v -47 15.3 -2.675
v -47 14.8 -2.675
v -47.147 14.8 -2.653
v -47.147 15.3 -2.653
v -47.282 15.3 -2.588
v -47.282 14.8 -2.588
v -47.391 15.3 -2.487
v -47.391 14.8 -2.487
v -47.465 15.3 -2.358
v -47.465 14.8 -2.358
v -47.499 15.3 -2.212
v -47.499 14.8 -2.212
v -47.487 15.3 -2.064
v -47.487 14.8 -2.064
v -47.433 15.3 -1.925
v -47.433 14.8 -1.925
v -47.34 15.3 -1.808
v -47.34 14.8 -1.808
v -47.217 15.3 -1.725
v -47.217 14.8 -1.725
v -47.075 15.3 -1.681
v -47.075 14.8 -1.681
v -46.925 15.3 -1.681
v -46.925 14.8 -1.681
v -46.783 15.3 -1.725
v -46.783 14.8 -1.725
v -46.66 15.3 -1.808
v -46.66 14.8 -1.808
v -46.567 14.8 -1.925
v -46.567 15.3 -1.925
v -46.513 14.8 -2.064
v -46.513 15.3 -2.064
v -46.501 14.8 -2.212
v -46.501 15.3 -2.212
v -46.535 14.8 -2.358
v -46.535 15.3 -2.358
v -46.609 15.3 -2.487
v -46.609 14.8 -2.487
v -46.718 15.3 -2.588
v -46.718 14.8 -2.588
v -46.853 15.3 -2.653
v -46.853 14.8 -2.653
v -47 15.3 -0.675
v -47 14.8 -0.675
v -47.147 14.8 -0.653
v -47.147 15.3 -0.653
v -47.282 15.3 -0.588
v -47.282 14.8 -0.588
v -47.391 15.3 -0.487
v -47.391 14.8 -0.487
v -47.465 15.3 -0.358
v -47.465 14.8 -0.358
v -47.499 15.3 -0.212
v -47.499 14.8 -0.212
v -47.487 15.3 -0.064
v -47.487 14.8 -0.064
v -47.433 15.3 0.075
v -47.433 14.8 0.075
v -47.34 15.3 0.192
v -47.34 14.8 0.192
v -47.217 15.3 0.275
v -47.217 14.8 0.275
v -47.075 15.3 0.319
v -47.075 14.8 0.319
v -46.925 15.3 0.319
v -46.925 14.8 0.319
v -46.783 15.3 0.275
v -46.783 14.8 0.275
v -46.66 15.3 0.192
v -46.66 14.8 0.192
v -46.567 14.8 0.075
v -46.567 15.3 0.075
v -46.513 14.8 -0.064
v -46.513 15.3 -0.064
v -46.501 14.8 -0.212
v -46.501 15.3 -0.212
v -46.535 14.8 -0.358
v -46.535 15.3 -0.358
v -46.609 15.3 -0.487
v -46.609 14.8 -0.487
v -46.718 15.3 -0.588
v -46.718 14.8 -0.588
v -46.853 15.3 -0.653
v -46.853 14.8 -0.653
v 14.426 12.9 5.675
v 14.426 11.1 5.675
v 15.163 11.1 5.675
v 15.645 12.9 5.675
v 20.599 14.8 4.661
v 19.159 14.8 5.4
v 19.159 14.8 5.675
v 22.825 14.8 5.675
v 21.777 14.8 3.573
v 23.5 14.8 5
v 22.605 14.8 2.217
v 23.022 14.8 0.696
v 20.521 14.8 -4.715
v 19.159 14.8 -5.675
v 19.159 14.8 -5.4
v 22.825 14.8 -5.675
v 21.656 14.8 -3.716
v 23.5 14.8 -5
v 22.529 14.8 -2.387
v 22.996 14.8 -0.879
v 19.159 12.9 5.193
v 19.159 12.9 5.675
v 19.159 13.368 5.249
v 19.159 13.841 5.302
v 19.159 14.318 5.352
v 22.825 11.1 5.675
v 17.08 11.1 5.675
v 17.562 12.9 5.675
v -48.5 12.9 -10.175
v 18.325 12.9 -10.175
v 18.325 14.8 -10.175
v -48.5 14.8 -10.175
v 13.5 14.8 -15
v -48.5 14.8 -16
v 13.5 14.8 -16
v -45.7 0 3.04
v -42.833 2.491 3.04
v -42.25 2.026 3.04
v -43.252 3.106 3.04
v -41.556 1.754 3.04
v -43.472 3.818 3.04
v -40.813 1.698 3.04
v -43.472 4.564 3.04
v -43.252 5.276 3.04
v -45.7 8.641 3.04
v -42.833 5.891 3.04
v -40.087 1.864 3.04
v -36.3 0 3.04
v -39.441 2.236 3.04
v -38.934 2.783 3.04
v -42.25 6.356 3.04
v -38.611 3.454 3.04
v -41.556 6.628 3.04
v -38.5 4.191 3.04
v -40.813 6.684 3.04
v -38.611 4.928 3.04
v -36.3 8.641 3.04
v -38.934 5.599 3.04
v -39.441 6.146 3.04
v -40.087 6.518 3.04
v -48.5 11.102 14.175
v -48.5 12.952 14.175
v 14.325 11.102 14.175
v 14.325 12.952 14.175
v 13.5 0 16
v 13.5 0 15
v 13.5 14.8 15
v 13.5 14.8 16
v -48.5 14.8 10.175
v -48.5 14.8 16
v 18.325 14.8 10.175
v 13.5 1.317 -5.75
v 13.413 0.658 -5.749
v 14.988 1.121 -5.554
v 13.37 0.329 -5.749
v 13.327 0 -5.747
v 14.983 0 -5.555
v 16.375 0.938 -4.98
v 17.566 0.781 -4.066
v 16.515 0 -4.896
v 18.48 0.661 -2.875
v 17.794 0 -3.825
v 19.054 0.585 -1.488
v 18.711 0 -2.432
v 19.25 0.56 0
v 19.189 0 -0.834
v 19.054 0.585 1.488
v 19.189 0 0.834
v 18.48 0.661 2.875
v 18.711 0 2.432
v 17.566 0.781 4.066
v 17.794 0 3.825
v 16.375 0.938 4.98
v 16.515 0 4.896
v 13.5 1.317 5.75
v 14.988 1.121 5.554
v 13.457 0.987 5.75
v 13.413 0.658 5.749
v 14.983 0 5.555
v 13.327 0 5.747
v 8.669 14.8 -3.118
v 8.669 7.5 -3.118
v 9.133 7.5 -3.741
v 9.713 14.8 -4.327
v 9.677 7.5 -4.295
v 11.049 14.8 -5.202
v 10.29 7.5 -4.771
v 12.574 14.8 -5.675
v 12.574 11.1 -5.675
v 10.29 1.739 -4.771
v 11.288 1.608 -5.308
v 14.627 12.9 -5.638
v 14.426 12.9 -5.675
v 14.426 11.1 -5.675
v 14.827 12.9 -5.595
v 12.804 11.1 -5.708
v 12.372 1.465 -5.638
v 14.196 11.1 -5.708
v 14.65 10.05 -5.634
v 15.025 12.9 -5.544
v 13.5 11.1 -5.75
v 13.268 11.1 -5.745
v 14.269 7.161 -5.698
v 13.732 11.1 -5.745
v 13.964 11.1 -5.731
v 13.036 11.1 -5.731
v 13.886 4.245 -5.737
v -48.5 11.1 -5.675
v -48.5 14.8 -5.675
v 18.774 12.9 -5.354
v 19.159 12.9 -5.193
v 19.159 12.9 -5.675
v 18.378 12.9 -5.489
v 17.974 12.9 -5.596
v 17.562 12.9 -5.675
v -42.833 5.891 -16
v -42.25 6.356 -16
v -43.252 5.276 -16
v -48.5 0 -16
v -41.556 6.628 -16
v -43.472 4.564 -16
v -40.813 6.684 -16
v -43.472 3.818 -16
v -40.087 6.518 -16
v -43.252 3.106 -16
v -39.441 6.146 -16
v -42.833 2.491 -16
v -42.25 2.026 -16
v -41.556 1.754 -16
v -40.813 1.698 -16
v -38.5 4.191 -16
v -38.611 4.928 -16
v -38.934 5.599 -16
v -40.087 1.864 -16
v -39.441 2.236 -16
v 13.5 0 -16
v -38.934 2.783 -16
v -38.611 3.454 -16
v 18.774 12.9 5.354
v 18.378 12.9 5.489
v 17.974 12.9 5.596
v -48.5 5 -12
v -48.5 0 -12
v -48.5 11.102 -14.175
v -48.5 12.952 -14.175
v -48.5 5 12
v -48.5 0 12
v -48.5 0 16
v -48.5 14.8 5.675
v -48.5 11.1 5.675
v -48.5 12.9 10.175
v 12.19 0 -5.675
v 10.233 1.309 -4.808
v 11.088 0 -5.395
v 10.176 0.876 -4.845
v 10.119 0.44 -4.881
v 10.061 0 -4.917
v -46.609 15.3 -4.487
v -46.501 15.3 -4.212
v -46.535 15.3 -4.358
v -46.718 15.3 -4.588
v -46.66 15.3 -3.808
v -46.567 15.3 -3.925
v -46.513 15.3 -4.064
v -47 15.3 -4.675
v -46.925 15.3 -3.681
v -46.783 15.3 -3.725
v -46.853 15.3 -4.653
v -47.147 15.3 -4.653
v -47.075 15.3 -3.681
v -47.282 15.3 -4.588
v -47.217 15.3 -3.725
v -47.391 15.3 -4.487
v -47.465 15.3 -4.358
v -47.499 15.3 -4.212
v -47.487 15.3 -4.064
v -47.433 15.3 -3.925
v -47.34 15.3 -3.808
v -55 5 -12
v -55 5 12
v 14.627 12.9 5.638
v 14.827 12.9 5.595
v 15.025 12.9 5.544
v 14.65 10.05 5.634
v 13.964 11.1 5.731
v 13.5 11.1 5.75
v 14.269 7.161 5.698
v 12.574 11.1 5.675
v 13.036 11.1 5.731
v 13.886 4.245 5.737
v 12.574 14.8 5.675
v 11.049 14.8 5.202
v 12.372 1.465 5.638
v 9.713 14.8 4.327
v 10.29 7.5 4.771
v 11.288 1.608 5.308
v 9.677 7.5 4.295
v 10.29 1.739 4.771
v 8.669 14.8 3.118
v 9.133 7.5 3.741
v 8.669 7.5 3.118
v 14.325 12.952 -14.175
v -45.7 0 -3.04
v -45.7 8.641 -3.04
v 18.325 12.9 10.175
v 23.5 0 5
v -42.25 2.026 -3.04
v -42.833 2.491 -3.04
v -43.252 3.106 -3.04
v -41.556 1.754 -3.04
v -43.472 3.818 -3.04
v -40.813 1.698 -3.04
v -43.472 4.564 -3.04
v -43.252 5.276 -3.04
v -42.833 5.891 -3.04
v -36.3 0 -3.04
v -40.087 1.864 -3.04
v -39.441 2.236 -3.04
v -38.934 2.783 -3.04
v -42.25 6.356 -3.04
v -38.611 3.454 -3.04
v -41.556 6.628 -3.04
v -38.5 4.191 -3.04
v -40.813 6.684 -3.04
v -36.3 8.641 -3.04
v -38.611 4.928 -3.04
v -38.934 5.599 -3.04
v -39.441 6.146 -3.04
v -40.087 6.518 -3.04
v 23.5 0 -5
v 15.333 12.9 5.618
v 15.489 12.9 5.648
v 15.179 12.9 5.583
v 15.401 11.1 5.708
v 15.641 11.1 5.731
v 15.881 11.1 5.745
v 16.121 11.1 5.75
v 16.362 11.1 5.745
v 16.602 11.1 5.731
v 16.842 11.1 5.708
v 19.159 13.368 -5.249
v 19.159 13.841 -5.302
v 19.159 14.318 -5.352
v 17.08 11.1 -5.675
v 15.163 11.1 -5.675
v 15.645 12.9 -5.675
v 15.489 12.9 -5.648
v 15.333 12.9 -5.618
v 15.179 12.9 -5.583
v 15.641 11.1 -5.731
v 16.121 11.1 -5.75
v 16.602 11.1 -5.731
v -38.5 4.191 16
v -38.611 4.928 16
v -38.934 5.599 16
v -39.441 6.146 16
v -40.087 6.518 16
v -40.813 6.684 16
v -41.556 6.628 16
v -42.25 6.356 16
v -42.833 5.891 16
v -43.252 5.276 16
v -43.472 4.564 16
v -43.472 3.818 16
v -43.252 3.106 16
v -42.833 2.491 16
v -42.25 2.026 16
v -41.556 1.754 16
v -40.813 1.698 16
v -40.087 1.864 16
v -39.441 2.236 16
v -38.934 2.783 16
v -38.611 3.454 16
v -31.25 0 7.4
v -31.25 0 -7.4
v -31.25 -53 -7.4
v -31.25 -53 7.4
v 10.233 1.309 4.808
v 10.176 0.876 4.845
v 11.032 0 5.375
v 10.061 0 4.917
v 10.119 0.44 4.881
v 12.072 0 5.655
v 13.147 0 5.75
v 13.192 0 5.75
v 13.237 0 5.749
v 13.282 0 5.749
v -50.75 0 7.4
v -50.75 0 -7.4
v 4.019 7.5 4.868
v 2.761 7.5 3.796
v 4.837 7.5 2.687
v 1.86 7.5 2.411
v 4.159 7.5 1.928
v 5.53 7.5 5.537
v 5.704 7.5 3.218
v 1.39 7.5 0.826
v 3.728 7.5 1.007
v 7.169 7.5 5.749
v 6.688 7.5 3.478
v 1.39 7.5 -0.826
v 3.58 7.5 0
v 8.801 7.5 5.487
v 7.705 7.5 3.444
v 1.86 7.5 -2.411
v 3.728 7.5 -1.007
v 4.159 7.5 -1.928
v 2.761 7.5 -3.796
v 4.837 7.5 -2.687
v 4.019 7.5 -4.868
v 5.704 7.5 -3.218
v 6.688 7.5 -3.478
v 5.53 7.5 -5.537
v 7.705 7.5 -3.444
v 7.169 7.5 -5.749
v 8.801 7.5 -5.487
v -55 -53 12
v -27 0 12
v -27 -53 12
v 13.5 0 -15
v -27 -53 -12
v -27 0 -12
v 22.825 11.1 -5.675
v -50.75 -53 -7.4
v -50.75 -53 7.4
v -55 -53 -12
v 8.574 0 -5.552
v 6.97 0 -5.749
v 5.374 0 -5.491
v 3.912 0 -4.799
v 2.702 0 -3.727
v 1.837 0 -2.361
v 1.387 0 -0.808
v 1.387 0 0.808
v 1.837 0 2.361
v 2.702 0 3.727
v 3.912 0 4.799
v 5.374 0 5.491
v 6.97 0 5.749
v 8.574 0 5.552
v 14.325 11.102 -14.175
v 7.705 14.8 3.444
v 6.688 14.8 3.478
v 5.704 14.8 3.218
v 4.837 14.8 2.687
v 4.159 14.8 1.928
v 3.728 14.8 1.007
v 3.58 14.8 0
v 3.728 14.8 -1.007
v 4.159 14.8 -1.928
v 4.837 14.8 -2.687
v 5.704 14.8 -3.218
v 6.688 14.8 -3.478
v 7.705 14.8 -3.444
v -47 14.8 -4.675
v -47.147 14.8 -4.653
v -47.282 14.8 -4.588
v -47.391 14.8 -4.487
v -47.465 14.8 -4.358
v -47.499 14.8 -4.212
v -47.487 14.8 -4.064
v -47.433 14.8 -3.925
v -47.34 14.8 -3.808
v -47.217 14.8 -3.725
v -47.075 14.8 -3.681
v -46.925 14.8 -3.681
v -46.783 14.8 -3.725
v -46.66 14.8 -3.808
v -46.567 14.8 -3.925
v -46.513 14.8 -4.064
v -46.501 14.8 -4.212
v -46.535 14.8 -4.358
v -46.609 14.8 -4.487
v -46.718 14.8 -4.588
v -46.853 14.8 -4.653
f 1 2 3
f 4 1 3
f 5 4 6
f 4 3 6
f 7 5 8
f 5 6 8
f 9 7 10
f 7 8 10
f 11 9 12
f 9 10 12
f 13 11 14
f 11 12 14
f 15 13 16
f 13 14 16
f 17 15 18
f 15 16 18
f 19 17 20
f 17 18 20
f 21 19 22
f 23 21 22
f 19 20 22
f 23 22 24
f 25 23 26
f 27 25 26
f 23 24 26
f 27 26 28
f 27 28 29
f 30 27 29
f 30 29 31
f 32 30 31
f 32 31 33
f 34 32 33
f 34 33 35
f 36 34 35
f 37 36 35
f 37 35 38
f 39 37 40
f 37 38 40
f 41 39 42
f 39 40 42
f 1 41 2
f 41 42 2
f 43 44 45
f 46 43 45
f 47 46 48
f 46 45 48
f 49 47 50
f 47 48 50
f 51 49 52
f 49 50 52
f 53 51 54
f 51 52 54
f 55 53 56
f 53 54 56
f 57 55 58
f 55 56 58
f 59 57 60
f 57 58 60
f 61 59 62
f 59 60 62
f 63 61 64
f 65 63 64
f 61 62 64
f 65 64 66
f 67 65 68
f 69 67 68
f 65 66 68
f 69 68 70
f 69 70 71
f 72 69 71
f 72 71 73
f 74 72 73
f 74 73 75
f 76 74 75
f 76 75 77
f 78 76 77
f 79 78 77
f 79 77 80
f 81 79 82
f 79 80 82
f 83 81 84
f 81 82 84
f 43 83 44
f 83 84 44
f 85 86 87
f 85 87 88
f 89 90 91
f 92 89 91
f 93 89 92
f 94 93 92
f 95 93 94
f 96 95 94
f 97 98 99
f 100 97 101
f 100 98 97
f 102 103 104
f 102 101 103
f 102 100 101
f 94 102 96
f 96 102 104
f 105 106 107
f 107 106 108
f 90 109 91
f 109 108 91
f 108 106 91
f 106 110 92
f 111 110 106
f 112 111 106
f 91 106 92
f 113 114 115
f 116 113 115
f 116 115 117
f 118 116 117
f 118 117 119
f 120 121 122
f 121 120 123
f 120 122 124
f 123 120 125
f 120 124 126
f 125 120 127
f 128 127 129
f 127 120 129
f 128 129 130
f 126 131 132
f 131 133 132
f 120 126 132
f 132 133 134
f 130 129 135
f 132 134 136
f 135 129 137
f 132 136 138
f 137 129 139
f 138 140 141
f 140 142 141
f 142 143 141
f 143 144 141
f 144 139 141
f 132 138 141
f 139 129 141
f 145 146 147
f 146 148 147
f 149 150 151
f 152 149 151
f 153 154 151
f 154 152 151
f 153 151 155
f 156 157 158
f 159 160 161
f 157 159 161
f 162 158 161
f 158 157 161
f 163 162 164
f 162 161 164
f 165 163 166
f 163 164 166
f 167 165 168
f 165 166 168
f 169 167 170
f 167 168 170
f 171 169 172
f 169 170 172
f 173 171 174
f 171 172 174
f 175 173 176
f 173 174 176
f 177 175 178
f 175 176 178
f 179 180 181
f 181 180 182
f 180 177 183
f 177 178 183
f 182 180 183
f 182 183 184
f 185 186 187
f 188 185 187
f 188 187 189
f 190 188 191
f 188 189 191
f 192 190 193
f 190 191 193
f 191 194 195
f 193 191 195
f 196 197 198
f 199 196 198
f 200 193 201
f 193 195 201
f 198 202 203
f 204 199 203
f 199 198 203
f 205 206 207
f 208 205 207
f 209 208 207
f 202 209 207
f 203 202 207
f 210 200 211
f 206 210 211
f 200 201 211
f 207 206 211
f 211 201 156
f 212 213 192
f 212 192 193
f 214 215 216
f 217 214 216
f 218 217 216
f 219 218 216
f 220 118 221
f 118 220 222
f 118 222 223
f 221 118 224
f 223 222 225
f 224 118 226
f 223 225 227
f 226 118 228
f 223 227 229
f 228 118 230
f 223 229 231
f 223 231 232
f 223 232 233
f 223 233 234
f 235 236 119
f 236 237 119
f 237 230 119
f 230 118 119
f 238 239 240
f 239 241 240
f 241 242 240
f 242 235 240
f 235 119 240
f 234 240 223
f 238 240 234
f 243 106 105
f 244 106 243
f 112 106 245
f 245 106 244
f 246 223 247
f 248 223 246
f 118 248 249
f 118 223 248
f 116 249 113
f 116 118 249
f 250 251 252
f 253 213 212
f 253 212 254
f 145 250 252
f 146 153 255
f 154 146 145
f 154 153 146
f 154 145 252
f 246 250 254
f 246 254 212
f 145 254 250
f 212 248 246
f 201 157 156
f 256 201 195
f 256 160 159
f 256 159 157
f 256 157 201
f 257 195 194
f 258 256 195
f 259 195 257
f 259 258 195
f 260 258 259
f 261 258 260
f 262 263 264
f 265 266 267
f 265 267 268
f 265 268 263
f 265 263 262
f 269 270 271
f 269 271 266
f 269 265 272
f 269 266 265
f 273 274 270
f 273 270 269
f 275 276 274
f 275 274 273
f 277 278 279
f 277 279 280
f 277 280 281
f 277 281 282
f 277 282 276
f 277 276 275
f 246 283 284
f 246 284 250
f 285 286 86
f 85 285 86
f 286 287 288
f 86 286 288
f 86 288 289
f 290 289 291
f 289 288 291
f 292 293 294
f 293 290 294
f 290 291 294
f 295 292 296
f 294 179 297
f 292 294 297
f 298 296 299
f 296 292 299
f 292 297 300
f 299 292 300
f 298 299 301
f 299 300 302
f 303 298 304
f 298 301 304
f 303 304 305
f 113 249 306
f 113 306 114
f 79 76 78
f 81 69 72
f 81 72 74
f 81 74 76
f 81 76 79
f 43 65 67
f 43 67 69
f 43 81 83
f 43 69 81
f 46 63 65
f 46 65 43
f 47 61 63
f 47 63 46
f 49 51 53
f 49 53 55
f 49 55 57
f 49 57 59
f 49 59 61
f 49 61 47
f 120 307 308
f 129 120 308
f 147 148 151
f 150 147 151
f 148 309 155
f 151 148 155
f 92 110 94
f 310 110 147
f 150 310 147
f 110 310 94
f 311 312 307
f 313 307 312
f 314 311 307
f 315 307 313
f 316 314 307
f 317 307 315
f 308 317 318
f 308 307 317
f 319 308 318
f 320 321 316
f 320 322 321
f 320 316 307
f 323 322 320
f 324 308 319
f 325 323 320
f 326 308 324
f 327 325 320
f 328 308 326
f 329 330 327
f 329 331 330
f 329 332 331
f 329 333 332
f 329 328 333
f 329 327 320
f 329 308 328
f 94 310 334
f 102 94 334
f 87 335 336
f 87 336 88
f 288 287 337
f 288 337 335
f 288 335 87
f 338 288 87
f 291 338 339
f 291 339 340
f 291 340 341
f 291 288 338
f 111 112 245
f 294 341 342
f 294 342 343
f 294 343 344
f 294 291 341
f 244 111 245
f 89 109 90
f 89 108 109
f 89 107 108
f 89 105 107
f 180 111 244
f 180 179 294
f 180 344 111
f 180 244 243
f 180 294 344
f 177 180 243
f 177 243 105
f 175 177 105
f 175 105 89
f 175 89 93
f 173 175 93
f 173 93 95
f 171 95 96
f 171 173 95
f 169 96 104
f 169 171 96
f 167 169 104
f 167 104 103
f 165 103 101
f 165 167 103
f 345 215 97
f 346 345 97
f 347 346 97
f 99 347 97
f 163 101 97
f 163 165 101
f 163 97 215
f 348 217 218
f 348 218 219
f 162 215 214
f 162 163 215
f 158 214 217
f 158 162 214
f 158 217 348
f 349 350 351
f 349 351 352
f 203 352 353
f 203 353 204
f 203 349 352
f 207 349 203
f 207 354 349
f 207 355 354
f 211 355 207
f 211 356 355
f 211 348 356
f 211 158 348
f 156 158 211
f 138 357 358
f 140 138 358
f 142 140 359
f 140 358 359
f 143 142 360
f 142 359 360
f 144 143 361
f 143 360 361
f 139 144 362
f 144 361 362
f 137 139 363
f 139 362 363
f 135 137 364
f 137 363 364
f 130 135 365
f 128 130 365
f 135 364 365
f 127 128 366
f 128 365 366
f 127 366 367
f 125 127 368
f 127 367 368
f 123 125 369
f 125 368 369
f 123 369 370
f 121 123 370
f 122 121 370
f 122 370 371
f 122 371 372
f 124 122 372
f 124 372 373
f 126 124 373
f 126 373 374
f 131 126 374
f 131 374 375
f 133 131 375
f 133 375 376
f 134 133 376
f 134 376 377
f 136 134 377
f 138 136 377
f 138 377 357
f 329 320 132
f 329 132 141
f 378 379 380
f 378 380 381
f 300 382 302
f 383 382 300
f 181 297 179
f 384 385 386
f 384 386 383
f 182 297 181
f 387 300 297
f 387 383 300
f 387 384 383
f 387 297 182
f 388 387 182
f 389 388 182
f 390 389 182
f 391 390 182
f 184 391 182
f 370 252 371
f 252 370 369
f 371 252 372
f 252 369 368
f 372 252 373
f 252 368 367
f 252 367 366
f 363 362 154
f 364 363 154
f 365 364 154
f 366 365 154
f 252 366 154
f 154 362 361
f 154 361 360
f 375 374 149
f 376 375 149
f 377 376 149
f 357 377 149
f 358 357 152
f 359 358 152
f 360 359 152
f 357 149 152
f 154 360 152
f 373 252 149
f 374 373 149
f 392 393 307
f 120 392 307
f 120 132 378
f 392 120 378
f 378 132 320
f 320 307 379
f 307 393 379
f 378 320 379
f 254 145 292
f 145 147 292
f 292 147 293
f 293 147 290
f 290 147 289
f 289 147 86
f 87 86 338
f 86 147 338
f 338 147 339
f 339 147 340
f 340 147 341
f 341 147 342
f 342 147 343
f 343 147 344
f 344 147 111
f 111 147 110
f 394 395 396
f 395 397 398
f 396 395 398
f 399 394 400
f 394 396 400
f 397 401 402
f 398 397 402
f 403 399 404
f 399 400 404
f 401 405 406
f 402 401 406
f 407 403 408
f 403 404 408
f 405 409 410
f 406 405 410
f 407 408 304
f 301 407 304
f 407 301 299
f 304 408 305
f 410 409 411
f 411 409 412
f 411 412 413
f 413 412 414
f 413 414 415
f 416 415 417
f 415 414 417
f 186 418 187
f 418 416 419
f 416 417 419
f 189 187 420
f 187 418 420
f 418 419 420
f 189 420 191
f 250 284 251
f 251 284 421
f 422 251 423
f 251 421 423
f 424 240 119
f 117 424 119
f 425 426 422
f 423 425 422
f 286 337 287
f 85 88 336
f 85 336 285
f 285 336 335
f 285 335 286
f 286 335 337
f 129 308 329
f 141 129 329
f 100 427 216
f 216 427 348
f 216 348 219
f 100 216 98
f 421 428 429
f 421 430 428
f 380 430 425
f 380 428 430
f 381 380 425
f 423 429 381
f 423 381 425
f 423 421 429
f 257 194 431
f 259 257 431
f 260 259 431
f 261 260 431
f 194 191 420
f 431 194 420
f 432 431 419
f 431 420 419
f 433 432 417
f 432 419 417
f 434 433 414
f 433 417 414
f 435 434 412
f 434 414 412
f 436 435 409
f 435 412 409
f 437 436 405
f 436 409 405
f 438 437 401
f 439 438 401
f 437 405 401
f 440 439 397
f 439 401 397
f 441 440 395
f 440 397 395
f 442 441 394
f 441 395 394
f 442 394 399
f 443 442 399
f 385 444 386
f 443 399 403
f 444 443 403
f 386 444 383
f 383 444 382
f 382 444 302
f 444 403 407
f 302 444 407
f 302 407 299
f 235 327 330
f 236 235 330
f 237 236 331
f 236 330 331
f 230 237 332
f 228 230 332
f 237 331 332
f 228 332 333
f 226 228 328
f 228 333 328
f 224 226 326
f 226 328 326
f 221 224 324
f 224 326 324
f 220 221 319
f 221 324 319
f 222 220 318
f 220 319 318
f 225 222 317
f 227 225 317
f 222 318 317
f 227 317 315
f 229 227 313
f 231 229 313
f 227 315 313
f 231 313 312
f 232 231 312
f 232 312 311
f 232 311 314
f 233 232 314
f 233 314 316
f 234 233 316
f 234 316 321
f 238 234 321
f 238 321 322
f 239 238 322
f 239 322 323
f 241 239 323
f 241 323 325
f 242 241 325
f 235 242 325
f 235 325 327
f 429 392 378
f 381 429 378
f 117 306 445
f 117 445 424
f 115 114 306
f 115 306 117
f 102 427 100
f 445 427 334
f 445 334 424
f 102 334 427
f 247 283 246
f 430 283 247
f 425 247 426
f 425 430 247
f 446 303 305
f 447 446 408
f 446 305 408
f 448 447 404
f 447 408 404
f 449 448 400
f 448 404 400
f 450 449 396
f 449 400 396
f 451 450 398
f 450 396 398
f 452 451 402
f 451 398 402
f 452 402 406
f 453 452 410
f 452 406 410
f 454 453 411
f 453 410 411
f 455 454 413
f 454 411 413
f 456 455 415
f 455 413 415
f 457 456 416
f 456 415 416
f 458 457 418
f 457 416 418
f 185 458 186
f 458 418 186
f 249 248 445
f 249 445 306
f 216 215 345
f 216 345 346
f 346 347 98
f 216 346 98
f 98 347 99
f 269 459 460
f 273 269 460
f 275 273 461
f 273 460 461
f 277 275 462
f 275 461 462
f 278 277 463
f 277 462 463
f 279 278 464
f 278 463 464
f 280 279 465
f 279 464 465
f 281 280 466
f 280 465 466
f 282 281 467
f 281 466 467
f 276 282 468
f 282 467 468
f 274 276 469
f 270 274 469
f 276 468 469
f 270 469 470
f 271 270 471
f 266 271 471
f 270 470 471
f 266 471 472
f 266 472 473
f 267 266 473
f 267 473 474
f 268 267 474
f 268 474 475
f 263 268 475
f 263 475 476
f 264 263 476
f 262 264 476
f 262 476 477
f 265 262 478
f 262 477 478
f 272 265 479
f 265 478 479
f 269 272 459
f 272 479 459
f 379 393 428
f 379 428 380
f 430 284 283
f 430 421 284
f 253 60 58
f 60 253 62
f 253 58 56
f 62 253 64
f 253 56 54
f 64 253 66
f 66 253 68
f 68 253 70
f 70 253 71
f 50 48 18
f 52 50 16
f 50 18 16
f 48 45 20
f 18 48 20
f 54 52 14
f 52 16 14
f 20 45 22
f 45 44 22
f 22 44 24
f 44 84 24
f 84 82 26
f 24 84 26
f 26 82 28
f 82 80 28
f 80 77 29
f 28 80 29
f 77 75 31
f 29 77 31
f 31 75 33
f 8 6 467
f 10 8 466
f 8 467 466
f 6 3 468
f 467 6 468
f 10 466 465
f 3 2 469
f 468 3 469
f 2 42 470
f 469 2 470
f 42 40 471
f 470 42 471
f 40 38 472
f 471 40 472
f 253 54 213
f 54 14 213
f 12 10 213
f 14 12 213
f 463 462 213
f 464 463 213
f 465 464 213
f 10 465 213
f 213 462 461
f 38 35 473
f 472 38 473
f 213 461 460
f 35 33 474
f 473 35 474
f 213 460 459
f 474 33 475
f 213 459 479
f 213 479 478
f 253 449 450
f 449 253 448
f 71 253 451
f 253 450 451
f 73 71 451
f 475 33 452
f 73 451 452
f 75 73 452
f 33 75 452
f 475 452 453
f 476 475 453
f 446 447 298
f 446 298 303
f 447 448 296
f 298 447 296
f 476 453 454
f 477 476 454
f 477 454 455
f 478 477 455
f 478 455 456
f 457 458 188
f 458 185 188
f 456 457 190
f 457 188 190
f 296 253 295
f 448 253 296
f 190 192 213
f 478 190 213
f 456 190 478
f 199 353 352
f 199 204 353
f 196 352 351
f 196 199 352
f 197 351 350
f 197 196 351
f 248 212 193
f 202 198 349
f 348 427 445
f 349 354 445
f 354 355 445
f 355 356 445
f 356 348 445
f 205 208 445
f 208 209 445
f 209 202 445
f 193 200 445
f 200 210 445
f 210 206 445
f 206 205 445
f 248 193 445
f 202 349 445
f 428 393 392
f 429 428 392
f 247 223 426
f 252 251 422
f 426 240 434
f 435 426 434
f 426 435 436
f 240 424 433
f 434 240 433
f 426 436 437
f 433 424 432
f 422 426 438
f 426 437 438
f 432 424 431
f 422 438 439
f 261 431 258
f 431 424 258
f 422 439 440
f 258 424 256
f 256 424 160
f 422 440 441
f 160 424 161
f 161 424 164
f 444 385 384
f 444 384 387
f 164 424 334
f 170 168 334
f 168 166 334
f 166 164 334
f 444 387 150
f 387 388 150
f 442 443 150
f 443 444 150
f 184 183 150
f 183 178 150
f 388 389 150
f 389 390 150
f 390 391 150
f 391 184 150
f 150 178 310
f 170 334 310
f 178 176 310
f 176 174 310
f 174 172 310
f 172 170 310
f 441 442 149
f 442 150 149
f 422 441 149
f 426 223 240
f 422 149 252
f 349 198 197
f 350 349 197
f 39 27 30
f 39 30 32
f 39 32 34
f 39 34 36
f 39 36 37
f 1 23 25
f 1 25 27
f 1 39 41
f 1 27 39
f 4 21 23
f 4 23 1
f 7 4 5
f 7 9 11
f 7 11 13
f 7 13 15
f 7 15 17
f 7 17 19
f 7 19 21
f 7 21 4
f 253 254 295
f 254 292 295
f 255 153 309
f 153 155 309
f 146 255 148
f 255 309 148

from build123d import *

# Parameters (mm, degrees)
SKETCH1_W               = 47
SKETCH1_H               = 30
BOSS_EXTRUDE1_DEPTH     = 14.8
SKETCH2_R               = 5.75
CUT_EXTRUDE1_DEPTH      = 32.564061843
SKETCH10_W              = 15
SKETCH10_H              = 23
BOSS_EXTRUDE2_DEPTH     = 10
SKETCH9_R               = 2.5
CUT_EXTRUDE2_DEPTH      = 52.780787943
SKETCH9_3_W             = 8.89
SKETCH9_3_H             = 8.382
SKETCH9_3_R             = 2.5
CUT_EXTRUDE3_DEPTH      = 28.04
SKETCH14_W              = 11.152996248
SKETCH14_H              = 9.480152006
BOSS_EXTRUDE3_DEPTH     = 11.96
CUT_EXTRUDE6_DEPTH      = 31
CUT_EXTRUDE6_DEPTH_BACK = 111
SKETCH15_R              = 2.5
CHAMFER1_SIZE           = 10
CUT_EXTRUDE7_DEPTH      = 58.99137867
SKETCH17_W              = 15
SKETCH17_H              = 23
CUT_EXTRUDE8_DEPTH      = 10
CUT_EXTRUDE9_DEPTH      = 31.734725749
CUT_EXTRUDE9_DEPTH_BACK = 31.734725749
SKETCH18_R              = 5.75
CUT_EXTRUDE10_START     = -7.3
SKETCH19_R              = 5.75
CUT_EXTRUDE10_DEPTH     = 25.264061843
SKETCH20_W              = 37
SKETCH20_H              = 14.8
SKETCH20_R              = 2.5
BOSS_EXTRUDE4_DEPTH     = 1
BOSS_EXTRUDE5_START     = 1
SKETCH21_W              = 37
SKETCH21_H              = 14.8
SKETCH21_R              = 2.5
BOSS_EXTRUDE5_DEPTH     = 1
BOSS_EXTRUDE6_DEPTH     = 25
CUT_EXTRUDE11_REACH     = 59.065
SKETCH22_W              = 5.115877125
SKETCH22_H              = 1.9
SKETCH24_R              = 2.5
CUT_EXTRUDE12_DEPTH     = 60.960737154
CUT_EXTRUDE13_START     = -19.04
SKETCH25_W              = 9.4
SKETCH25_H              = 8.9
CUT_EXTRUDE13_DEPTH     = 6.08
SKETCH26_W              = 23.327842288
SKETCH26_H              = 8.382
BOSS_EXTRUDE7_DEPTH     = 32
SKETCH27_R              = 3.5
CUT_EXTRUDE14_DEPTH     = 10
SKETCH28_R              = 0.5
BOSS_EXTRUDE8_DEPTH     = 0.5
SKETCH29_W              = 28
SKETCH29_H              = 24
SKETCH29_W_2            = 19.5
SKETCH29_H_2            = 14.8
BOSS_EXTRUDE9_DEPTH     = 53
SKETCH30_W              = 6.5
SKETCH30_H              = 24
BOSS_EXTRUDE10_DEPTH    = 5


with BuildPart() as part:
    # Sketch1 → Boss-Extrude1 (new body)
    with BuildSketch(Plane(origin=(0, 0, 0), x_dir=(1, 0, 0), z_dir=(0, 1, 0))):
        Rectangle(SKETCH1_W, SKETCH1_H)
    extrude(amount=BOSS_EXTRUDE1_DEPTH)

    # Sketch2 → Cut-Extrude1 (cut, through all)
    with BuildSketch(Plane.XZ):
        with Locations(Location((13.5, 0, 0), (0, 0, 270))):
            Circle(SKETCH2_R)
    extrude(amount=-CUT_EXTRUDE1_DEPTH, mode=Mode.SUBTRACT)

    # Sketch10 → Boss-Extrude2 (add)
    with BuildSketch(Plane.XY.offset(15)):
        with Locations((-16, 11.5)):
            Rectangle(SKETCH10_W, SKETCH10_H)
    extrude(amount=BOSS_EXTRUDE2_DEPTH)

    # Sketch9 → Cut-Extrude2 (cut, through all)
    with BuildSketch(Plane.XY.offset(25)):
        with Locations((-16, 4.191)):
            Circle(SKETCH9_R)
    extrude(amount=-CUT_EXTRUDE2_DEPTH, mode=Mode.SUBTRACT)

    # Sketch9<3> → Cut-Extrude3 (cut)
    with BuildSketch(Plane.XY.offset(25)):
        with Locations((-16, 4.191)):
            Rectangle(SKETCH9_3_W, SKETCH9_3_H)
        with Locations((-16, 4.191)):
            Circle(SKETCH9_3_R, mode=Mode.SUBTRACT)
    extrude(amount=-CUT_EXTRUDE3_DEPTH, mode=Mode.SUBTRACT)

    # Sketch14 → Boss-Extrude3 (add)
    with BuildSketch(Plane.XY.offset(15)):
        with Locations((-17.328151157, 4.740076003)):
            Rectangle(SKETCH14_W, SKETCH14_H)
    extrude(amount=-BOSS_EXTRUDE3_DEPTH)

    # Sketch15 → Cut-Extrude6 (cut, two sides: drawn at the far end of the back side and taken through both)
    with BuildSketch(Plane(origin=(0, 0, -15), x_dir=(-1, 0, 0), z_dir=(0, 0, -1)).offset(-CUT_EXTRUDE6_DEPTH_BACK)):
        with Locations(Location((16, 4.191, 0), (0, 0, 180))):
            Circle(SKETCH15_R)
    extrude(amount=CUT_EXTRUDE6_DEPTH + CUT_EXTRUDE6_DEPTH_BACK, mode=Mode.SUBTRACT)

    # Chamfer1
    chamfer1_edges = [part.edges().sort_by_distance(p)[0] for p in [
        (23.5, 7.4, 15),
        (23.5, 7.4, -15),
    ]]
    chamfer(chamfer1_edges, length=CHAMFER1_SIZE)

    # Sketch16 → Cut-Extrude7 (cut, through all)
    with BuildSketch(Plane.ZY.offset(23.5)):
        Polygon((10.175, 14.8), (10.175, 12.9), (14.174668145, 12.951524082), (14.174999863, 11.101524112), (5.675, 11.1), (5.675, 14.8), align=None)
        Polygon((-14.174999863, 11.101524112), (-5.675, 11.1), (-5.675, 14.8), (-10.175, 14.8), (-10.175, 12.9), (-14.174668145, 12.951524082), align=None)
    extrude(amount=-CUT_EXTRUDE7_DEPTH, mode=Mode.SUBTRACT)

    # Sketch17 → Cut-Extrude8 (cut)
    with BuildSketch(Plane.XY.offset(25)):
        with Locations((-16, 11.5)):
            Rectangle(SKETCH17_W, SKETCH17_H)
    extrude(amount=-CUT_EXTRUDE8_DEPTH, mode=Mode.SUBTRACT)

    # Sketch18 → Cut-Extrude9 (cut, two sides: drawn at the far end of the back side and taken through both)
    with BuildSketch(Plane(origin=(2.125798494, 7.933587988, 0), x_dir=(0, 0, 1), z_dir=(0.25881904510252474, 0.9659258262890673, 0)).offset(-CUT_EXTRUDE9_DEPTH_BACK)):
        with Locations((0, 12.699256918)):
            Circle(SKETCH18_R)
    extrude(amount=CUT_EXTRUDE9_DEPTH + CUT_EXTRUDE9_DEPTH_BACK, mode=Mode.SUBTRACT)

    # Sketch19 → Cut-Extrude10 (cut, through all)
    with BuildSketch(Plane(origin=(0, 14.8, 0), x_dir=(1, 0, 0), z_dir=(0, 1, 0)).offset(CUT_EXTRUDE10_START)):
        with Locations((7.08, 0)):
            Circle(SKETCH19_R)
    extrude(amount=-CUT_EXTRUDE10_DEPTH, mode=Mode.SUBTRACT)

    # Sketch20 → Boss-Extrude4 (add)
    with BuildSketch(Plane.XY.offset(15)):
        with Locations((-5, 7.4)):
            Rectangle(SKETCH20_W, SKETCH20_H)
        with Locations((-16, 4.191)):
            Circle(SKETCH20_R, mode=Mode.SUBTRACT)
    extrude(amount=BOSS_EXTRUDE4_DEPTH)

    # Sketch21 → Boss-Extrude5 (add)
    with BuildSketch(Plane(origin=(0, 0, -15), x_dir=(-1, 0, 0), z_dir=(0, 0, -1)).offset(BOSS_EXTRUDE5_START)):
        with Locations((5, 7.4)):
            Rectangle(SKETCH21_W, SKETCH21_H)
        with Locations(Location((16, 4.191, 0), (0, 0, 180))):
            Circle(SKETCH21_R, mode=Mode.SUBTRACT)
    extrude(amount=-BOSS_EXTRUDE5_DEPTH)

    # Sketch23 → Boss-Extrude6 (add)
    with BuildSketch(Plane.ZY.offset(23.5)):
        Polygon((-10.175, 14.8), (-16, 14.8), (-16, 0), (16, 0), (16, 14.8), (10.175, 14.8), (10.175, 12.9), (14.174668145, 12.951524082), (14.174999863, 11.101524112), (5.675, 11.1), (5.675, 14.8), (-5.675, 14.8), (-5.675, 11.1), (-14.174999863, 11.101524112), (-14.174668145, 12.951524082), (-10.175, 12.9), align=None)
    extrude(amount=BOSS_EXTRUDE6_DEPTH)

    # Cut-Extrude11: up to this face of the body (flat: up to its plane)
    cut_extrude11_end = Plane(part.part.faces().sort_by_distance((-2.5875, 13.85, -10.175))[0])
    # Sketch22 → Cut-Extrude11 (cut, up to the picked face)
    with BuildSketch(Plane(origin=(0, 0, 10.175), x_dir=(-1, 0, 0), z_dir=(0, 0, -1)), mode=Mode.PRIVATE) as cut_extrude11_sk1:
        with Locations((-16.601488732, 13.85)):
            Rectangle(SKETCH22_W, SKETCH22_H)
    cut_extrude11_tool1 = split(extrude(cut_extrude11_sk1.sketch, amount=CUT_EXTRUDE11_REACH, mode=Mode.PRIVATE), bisect_by=cut_extrude11_end, keep=Keep.BOTH, mode=Mode.PRIVATE)
    add(cut_extrude11_tool1.solids().sort_by(Axis((16.601489, 13.85, 10.175), (0, 0, -1)))[0], mode=Mode.SUBTRACT)

    # Sketch24 → Cut-Extrude12 (cut, through all)
    with BuildSketch(Plane.XY.offset(16)):
        with Locations((-41, 4.191)):
            Circle(SKETCH24_R)
    extrude(amount=-CUT_EXTRUDE12_DEPTH, mode=Mode.SUBTRACT)

    # Sketch25 → Cut-Extrude13 (cut)
    with BuildSketch(Plane.XY.offset(16).offset(CUT_EXTRUDE13_START)):
        with Locations((-41, 4.191)):
            Rectangle(SKETCH25_W, SKETCH25_H)
    extrude(amount=CUT_EXTRUDE13_DEPTH, mode=Mode.SUBTRACT)

    # Sketch26 → Boss-Extrude7 (add, through all)
    with BuildSketch(Plane.XY.offset(16)):
        with Locations((-16, 4.191)):
            Rectangle(SKETCH26_W, SKETCH26_H)
    extrude(amount=-BOSS_EXTRUDE7_DEPTH)

    # Sketch27 → Cut-Extrude14 (cut)
    with BuildSketch(Plane.XZ.offset(-7.5)):
        with Locations((7.08, 0)):
            Circle(SKETCH27_R)
    extrude(amount=-CUT_EXTRUDE14_DEPTH, mode=Mode.SUBTRACT)

    # Sketch28 → Boss-Extrude8 (add)
    with BuildSketch(Plane(origin=(0, 14.8, 0), x_dir=(1, 0, 0), z_dir=(0, 1, 0))):
        with Locations(Location((-47, 0.175, 0), (0, 0, 90))):
            Circle(SKETCH28_R)
        with Locations(Location((-47, 2.175, 0), (0, 0, 90))):
            Circle(SKETCH28_R)
        with Locations(Location((-47, 4.175, 0), (0, 0, 90))):
            Circle(SKETCH28_R)
    extrude(amount=BOSS_EXTRUDE8_DEPTH)

    # Sketch29 → Boss-Extrude9 (add)
    with BuildSketch(Plane.XZ):
        with Locations((-41, 0)):
            Rectangle(SKETCH29_W, SKETCH29_H)
        with Locations((-41, 0)):
            Rectangle(SKETCH29_W_2, SKETCH29_H_2, mode=Mode.SUBTRACT)
    extrude(amount=BOSS_EXTRUDE9_DEPTH)

    # Sketch30 → Boss-Extrude10 (add)
    with BuildSketch(Plane(origin=(0, 0, 0), x_dir=(1, 0, 0), z_dir=(0, 1, 0))):
        with Locations((-51.75, 0)):
            Rectangle(SKETCH30_W, SKETCH30_H)
    extrude(amount=BOSS_EXTRUDE10_DEPTH)


solid = part.part
